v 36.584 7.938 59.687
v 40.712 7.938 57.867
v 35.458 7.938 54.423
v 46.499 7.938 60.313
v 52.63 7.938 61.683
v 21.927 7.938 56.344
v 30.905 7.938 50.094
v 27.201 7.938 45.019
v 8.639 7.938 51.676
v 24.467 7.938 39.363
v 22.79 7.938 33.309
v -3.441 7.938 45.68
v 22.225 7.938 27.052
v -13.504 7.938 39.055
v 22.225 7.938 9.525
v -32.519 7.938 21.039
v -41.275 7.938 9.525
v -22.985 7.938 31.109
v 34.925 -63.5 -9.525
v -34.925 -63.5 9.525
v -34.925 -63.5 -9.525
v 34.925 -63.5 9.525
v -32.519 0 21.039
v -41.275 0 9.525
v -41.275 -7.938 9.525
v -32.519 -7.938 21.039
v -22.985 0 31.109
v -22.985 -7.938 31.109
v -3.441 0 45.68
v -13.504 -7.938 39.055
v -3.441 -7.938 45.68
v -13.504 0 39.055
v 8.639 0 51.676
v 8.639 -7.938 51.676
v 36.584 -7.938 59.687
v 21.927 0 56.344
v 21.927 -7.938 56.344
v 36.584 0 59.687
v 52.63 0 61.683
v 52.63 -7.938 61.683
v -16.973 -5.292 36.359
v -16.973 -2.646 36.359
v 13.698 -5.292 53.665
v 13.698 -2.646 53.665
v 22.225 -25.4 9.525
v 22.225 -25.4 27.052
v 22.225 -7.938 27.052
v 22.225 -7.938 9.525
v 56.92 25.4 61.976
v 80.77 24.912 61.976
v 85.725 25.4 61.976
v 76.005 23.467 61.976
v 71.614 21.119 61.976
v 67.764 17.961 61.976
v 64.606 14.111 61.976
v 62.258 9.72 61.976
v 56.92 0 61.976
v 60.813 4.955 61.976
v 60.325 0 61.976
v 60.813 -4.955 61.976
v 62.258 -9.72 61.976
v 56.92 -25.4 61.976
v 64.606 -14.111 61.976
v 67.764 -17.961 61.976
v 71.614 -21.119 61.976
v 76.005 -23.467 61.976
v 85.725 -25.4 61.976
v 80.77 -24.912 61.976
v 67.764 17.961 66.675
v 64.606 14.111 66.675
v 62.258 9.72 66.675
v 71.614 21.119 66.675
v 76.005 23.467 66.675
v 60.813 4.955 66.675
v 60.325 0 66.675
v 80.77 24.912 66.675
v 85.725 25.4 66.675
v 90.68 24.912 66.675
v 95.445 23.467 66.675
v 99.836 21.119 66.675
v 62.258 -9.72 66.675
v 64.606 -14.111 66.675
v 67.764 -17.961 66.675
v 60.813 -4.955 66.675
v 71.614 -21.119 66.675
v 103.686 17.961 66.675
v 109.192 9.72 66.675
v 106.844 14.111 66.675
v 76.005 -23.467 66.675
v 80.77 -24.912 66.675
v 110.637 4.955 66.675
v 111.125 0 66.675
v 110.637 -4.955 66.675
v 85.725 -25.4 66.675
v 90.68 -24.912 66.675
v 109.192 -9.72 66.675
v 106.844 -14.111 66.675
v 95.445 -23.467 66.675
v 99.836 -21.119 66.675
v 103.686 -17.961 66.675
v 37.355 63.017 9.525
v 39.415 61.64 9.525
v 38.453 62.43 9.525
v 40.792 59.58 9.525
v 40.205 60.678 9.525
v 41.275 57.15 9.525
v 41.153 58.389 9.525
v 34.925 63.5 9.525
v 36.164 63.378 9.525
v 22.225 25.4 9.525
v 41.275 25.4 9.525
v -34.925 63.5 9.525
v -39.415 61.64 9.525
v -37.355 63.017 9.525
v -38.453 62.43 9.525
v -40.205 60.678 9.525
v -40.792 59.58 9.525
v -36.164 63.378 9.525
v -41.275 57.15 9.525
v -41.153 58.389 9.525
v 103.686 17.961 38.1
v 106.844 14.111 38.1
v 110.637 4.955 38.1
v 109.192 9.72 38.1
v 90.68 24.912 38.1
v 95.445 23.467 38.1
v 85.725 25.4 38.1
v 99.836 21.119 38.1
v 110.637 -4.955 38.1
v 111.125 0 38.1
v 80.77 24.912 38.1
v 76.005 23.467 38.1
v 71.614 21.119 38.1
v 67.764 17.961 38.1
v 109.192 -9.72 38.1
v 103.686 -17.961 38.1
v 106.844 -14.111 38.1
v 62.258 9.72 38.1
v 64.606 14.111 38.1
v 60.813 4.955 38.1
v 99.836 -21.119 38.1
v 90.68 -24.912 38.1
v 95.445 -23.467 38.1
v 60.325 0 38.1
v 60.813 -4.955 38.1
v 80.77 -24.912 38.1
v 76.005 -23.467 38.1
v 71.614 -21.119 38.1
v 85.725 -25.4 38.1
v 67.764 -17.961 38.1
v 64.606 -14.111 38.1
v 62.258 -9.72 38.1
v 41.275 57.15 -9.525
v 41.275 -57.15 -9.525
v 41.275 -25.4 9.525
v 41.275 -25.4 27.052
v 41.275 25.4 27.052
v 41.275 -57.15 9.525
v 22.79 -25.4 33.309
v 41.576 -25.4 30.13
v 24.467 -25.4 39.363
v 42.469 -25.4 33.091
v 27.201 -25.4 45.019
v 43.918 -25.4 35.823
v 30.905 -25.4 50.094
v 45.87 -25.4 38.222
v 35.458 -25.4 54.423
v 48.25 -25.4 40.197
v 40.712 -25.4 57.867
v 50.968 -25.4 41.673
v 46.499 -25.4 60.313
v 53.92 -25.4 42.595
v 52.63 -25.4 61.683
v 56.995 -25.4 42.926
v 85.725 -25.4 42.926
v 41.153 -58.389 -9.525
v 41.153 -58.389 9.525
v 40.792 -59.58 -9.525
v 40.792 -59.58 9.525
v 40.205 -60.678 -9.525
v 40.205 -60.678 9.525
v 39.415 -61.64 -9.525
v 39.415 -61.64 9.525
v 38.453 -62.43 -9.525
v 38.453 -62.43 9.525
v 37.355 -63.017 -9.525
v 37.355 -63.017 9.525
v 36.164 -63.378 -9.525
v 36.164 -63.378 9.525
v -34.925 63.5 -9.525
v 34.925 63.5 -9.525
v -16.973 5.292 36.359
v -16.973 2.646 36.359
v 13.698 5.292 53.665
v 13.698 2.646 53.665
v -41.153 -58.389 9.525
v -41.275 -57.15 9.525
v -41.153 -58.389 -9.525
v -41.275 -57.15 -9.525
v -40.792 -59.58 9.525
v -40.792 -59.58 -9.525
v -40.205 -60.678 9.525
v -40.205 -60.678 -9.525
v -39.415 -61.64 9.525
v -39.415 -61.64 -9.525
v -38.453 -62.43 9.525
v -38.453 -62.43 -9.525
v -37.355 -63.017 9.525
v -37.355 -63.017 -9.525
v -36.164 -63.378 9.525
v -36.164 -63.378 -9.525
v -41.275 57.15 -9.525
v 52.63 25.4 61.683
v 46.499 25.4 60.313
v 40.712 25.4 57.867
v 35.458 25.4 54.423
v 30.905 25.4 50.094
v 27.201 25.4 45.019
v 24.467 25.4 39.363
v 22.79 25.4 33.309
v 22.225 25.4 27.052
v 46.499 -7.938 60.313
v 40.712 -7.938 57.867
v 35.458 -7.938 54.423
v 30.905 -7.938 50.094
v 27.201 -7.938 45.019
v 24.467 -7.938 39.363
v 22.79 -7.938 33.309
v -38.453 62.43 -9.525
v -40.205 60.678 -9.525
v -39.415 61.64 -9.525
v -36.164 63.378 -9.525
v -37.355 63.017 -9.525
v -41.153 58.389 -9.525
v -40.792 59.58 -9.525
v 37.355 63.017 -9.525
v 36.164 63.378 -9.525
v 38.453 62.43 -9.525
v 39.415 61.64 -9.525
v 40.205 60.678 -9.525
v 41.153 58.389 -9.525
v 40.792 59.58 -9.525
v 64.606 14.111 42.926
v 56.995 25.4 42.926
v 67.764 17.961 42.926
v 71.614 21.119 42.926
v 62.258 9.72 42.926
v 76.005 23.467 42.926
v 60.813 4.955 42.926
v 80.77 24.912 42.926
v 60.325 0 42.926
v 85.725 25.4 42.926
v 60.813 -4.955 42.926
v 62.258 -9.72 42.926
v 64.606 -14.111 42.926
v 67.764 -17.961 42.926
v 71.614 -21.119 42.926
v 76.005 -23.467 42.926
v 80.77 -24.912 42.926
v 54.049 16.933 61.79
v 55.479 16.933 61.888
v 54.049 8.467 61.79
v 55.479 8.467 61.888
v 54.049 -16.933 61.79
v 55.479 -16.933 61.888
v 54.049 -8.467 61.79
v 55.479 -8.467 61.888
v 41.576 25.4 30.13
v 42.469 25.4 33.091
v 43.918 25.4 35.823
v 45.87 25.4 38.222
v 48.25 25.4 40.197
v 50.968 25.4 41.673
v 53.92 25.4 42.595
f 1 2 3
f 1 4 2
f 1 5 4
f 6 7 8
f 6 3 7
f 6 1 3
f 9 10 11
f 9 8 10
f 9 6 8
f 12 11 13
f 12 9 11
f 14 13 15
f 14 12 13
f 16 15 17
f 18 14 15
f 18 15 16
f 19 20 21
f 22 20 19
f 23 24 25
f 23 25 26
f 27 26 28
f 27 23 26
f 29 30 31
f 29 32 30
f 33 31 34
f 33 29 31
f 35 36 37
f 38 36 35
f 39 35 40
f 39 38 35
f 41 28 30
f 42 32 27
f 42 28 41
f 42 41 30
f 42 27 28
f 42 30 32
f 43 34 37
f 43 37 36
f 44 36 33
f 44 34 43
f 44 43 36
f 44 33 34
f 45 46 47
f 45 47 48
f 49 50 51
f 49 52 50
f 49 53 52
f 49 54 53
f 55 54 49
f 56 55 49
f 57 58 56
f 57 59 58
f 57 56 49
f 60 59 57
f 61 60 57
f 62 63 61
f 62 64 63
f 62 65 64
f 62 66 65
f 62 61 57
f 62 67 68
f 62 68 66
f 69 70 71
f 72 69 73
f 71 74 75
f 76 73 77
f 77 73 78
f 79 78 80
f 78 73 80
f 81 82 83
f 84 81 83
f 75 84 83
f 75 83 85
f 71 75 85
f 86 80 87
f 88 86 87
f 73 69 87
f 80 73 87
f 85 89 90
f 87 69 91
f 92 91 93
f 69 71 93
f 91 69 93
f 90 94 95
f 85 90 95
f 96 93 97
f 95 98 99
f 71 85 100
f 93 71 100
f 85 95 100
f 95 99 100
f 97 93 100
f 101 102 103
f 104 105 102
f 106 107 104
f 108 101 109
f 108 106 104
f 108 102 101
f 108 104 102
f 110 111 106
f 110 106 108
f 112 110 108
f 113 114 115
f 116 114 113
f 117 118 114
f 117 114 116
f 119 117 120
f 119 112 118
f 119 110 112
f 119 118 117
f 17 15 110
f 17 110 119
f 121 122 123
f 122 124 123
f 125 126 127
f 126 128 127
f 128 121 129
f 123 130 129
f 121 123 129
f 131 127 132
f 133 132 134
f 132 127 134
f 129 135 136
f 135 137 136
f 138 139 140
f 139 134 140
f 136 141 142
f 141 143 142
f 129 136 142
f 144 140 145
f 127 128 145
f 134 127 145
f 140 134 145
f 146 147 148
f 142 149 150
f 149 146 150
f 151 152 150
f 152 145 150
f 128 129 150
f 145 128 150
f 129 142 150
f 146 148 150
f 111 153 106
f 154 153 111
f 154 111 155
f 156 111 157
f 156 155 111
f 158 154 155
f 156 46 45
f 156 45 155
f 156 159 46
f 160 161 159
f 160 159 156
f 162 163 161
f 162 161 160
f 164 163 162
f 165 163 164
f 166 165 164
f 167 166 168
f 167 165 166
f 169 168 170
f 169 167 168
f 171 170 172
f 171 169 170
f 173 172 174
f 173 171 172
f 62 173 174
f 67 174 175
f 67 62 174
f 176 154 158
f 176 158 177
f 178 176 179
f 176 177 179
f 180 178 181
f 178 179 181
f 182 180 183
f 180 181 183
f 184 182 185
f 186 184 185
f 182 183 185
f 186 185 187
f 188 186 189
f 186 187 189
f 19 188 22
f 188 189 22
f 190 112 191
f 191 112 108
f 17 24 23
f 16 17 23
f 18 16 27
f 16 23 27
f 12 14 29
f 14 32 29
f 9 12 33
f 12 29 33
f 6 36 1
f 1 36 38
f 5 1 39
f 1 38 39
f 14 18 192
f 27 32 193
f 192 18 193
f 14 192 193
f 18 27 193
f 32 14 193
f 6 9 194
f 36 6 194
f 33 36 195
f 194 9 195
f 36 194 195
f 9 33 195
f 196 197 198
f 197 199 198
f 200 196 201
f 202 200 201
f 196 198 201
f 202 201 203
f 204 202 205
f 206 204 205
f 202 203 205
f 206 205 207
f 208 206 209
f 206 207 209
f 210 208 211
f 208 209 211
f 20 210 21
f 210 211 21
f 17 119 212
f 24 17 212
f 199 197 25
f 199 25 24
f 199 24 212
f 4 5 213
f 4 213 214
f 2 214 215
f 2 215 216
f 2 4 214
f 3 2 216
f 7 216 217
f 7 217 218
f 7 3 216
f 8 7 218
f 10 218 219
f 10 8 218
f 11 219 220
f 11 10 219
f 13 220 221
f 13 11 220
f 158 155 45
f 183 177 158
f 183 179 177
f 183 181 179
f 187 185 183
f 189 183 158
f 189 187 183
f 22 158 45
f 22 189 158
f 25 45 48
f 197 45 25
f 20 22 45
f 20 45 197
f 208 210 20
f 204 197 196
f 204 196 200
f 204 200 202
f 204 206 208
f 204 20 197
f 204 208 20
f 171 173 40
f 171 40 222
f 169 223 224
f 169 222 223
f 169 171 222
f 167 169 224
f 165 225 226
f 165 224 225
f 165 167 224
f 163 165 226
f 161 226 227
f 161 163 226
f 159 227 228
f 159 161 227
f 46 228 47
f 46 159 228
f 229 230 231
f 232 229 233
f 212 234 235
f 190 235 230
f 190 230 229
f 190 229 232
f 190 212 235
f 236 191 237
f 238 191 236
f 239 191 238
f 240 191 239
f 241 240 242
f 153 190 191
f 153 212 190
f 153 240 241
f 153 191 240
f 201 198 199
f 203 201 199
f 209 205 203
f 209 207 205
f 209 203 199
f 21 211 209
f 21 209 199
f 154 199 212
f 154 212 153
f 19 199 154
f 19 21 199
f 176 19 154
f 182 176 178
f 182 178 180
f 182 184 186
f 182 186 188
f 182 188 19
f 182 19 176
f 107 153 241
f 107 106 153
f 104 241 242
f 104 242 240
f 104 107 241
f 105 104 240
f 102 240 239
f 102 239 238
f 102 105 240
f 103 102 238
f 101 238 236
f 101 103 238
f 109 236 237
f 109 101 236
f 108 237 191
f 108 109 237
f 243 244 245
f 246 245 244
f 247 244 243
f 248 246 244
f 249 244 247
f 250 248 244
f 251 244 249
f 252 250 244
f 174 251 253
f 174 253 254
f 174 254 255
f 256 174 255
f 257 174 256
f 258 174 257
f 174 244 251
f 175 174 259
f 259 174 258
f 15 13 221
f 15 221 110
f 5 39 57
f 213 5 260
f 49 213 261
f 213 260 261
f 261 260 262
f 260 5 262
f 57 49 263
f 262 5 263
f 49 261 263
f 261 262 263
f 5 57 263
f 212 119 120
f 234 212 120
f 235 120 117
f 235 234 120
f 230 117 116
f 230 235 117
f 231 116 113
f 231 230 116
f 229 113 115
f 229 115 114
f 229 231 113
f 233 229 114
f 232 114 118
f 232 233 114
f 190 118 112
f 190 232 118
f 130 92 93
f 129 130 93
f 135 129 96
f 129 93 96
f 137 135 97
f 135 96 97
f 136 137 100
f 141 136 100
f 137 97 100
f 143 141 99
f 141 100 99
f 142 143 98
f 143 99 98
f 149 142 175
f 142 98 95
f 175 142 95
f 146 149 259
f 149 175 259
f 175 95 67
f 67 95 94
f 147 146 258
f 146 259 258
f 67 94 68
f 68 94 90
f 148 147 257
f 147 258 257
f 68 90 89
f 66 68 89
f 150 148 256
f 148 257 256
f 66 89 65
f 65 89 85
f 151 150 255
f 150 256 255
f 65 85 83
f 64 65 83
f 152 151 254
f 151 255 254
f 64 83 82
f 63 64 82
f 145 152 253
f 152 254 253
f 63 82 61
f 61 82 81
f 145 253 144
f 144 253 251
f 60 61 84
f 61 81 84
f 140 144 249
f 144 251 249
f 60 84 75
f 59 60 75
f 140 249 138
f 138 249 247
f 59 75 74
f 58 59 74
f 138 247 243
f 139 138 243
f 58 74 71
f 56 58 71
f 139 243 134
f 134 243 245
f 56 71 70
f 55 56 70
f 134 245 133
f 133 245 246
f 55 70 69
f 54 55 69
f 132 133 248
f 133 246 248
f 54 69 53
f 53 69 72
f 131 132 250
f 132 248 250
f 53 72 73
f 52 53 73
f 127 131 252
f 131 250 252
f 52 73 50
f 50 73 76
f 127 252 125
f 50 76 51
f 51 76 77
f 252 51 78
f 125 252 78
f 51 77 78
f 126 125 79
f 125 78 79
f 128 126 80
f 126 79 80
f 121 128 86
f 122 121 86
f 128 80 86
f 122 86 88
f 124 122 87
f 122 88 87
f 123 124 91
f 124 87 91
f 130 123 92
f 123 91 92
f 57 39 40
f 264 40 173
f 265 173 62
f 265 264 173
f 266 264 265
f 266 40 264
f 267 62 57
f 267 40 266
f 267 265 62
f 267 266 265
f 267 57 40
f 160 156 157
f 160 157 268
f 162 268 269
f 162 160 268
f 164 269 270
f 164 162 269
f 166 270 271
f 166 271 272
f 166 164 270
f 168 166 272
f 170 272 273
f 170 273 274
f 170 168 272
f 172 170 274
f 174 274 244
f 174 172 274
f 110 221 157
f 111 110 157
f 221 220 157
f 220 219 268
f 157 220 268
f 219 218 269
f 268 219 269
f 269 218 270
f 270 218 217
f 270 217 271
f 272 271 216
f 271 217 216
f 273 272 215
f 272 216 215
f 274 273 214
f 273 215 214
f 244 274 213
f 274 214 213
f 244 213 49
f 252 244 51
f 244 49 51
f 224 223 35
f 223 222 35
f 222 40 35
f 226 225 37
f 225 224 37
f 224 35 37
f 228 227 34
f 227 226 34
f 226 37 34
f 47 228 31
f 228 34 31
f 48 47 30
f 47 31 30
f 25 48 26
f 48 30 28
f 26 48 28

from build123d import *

# Parameters (mm, degrees)
F1_DEPTH = 63.5
F0_W     = 25.4
F0_H     = 19.05
F2_DEPTH = 25.4
F3_DEPTH = 7.9375
F5_R     = 6.35


# Not quite as in the source:
# - a feature names something its author has since deleted; it is built from what else it names


with BuildPart() as f1:
    # F0 (on Front) → F1 (new body, symmetric)
    with BuildSketch(Plane.XZ):
        Polygon((22.225, 9.525), (-41.275, 9.525), (-41.275, -9.525), (41.275, -9.525), (41.275, 9.525), align=None)
    extrude(amount=F1_DEPTH, both=True)



with BuildPart() as f2:
    # F0 (on Front) → F2 (new body, symmetric)
    with BuildSketch(Plane.XZ):
        with BuildLine():
            Line((22.225, 27.0517572581), (22.225, 9.525))
            Line((22.225, 9.525), (41.275, 9.525))
            Line((41.275, 9.525), (41.275, 27.0517572581))
            ThreePointArc((41.275, 27.0517572581), (45.8699924784, 38.2221223064), (56.9949439764, 42.926))
            Line((56.9949439764, 42.926), (60.325, 42.926))
            Line((60.325, 42.926), (60.325, 61.976))
            Line((60.325, 61.976), (56.9200132545, 61.976))
            add(Edge.make_bspline(
                [(52.6300958014, 61.6830450054), (54.0440250085, 61.794890112), (55.4739013545, 61.892529432), (56.9200132545, 61.976)],
                knots=[107.8358858106, 107.8358858106, 107.8358858106, 107.8358858106, 111.3255048452, 111.3255048452, 111.3255048452, 111.3255048452], degree=3))
            ThreePointArc((52.6300958014, 61.6830450054), (30.9048739845, 50.0940875532), (22.225, 27.0517572581))
        make_face()
        with Locations((73.025, 52.451)):
            Rectangle(F0_W, F0_H)
    extrude(amount=F2_DEPTH, both=True)


with BuildPart() as f1_1:
    add(f1.part)

    add(f2.part)  # F3 merges F2
    # F0 (on Front) → F3 (join, symmetric)
    with BuildSketch(Plane.XZ):
        with BuildLine():
            add(Edge.make_bspline(
                [(-41.275, 9.525), (-19.5277563413, 41.2050885172), (8.9369857489, 58.2268178266), (52.6300958014, 61.6830450054)],
                knots=[0, 0, 0, 0, 107.8358858106, 107.8358858106, 107.8358858106, 107.8358858106], degree=3))
            Line((-41.275, 9.525), (22.225, 9.525))
            Line((22.225, 9.525), (22.225, 27.0517572581))
            ThreePointArc((22.225, 27.0517572581), (30.9048739845, 50.0940875532), (52.6300958014, 61.6830450054))
        make_face()
    extrude(amount=F3_DEPTH, both=True)

    # F0 (on Front) → F4 (revolve)
    with BuildSketch(Plane.XZ):
        Polygon((85.725, 66.675), (85.725, 61.976), (85.725, 42.926), (85.725, 38.1), (111.125, 38.1), (111.125, 66.675), align=None)
    revolve(axis=Axis((85.725, 0, 52.3875), (0, 0, -1)))

    # F5
    f5_edges = [f1_1.edges().sort_by_distance(p)[0] for p in [
        (-41.275, -63.5, 0),
        (41.275, -63.5, 0),
        (41.275, 63.5, 0),
        (-41.275, 63.5, 0),
    ]]
    fillet(f5_edges, radius=F5_R)


solid = f1_1.part
